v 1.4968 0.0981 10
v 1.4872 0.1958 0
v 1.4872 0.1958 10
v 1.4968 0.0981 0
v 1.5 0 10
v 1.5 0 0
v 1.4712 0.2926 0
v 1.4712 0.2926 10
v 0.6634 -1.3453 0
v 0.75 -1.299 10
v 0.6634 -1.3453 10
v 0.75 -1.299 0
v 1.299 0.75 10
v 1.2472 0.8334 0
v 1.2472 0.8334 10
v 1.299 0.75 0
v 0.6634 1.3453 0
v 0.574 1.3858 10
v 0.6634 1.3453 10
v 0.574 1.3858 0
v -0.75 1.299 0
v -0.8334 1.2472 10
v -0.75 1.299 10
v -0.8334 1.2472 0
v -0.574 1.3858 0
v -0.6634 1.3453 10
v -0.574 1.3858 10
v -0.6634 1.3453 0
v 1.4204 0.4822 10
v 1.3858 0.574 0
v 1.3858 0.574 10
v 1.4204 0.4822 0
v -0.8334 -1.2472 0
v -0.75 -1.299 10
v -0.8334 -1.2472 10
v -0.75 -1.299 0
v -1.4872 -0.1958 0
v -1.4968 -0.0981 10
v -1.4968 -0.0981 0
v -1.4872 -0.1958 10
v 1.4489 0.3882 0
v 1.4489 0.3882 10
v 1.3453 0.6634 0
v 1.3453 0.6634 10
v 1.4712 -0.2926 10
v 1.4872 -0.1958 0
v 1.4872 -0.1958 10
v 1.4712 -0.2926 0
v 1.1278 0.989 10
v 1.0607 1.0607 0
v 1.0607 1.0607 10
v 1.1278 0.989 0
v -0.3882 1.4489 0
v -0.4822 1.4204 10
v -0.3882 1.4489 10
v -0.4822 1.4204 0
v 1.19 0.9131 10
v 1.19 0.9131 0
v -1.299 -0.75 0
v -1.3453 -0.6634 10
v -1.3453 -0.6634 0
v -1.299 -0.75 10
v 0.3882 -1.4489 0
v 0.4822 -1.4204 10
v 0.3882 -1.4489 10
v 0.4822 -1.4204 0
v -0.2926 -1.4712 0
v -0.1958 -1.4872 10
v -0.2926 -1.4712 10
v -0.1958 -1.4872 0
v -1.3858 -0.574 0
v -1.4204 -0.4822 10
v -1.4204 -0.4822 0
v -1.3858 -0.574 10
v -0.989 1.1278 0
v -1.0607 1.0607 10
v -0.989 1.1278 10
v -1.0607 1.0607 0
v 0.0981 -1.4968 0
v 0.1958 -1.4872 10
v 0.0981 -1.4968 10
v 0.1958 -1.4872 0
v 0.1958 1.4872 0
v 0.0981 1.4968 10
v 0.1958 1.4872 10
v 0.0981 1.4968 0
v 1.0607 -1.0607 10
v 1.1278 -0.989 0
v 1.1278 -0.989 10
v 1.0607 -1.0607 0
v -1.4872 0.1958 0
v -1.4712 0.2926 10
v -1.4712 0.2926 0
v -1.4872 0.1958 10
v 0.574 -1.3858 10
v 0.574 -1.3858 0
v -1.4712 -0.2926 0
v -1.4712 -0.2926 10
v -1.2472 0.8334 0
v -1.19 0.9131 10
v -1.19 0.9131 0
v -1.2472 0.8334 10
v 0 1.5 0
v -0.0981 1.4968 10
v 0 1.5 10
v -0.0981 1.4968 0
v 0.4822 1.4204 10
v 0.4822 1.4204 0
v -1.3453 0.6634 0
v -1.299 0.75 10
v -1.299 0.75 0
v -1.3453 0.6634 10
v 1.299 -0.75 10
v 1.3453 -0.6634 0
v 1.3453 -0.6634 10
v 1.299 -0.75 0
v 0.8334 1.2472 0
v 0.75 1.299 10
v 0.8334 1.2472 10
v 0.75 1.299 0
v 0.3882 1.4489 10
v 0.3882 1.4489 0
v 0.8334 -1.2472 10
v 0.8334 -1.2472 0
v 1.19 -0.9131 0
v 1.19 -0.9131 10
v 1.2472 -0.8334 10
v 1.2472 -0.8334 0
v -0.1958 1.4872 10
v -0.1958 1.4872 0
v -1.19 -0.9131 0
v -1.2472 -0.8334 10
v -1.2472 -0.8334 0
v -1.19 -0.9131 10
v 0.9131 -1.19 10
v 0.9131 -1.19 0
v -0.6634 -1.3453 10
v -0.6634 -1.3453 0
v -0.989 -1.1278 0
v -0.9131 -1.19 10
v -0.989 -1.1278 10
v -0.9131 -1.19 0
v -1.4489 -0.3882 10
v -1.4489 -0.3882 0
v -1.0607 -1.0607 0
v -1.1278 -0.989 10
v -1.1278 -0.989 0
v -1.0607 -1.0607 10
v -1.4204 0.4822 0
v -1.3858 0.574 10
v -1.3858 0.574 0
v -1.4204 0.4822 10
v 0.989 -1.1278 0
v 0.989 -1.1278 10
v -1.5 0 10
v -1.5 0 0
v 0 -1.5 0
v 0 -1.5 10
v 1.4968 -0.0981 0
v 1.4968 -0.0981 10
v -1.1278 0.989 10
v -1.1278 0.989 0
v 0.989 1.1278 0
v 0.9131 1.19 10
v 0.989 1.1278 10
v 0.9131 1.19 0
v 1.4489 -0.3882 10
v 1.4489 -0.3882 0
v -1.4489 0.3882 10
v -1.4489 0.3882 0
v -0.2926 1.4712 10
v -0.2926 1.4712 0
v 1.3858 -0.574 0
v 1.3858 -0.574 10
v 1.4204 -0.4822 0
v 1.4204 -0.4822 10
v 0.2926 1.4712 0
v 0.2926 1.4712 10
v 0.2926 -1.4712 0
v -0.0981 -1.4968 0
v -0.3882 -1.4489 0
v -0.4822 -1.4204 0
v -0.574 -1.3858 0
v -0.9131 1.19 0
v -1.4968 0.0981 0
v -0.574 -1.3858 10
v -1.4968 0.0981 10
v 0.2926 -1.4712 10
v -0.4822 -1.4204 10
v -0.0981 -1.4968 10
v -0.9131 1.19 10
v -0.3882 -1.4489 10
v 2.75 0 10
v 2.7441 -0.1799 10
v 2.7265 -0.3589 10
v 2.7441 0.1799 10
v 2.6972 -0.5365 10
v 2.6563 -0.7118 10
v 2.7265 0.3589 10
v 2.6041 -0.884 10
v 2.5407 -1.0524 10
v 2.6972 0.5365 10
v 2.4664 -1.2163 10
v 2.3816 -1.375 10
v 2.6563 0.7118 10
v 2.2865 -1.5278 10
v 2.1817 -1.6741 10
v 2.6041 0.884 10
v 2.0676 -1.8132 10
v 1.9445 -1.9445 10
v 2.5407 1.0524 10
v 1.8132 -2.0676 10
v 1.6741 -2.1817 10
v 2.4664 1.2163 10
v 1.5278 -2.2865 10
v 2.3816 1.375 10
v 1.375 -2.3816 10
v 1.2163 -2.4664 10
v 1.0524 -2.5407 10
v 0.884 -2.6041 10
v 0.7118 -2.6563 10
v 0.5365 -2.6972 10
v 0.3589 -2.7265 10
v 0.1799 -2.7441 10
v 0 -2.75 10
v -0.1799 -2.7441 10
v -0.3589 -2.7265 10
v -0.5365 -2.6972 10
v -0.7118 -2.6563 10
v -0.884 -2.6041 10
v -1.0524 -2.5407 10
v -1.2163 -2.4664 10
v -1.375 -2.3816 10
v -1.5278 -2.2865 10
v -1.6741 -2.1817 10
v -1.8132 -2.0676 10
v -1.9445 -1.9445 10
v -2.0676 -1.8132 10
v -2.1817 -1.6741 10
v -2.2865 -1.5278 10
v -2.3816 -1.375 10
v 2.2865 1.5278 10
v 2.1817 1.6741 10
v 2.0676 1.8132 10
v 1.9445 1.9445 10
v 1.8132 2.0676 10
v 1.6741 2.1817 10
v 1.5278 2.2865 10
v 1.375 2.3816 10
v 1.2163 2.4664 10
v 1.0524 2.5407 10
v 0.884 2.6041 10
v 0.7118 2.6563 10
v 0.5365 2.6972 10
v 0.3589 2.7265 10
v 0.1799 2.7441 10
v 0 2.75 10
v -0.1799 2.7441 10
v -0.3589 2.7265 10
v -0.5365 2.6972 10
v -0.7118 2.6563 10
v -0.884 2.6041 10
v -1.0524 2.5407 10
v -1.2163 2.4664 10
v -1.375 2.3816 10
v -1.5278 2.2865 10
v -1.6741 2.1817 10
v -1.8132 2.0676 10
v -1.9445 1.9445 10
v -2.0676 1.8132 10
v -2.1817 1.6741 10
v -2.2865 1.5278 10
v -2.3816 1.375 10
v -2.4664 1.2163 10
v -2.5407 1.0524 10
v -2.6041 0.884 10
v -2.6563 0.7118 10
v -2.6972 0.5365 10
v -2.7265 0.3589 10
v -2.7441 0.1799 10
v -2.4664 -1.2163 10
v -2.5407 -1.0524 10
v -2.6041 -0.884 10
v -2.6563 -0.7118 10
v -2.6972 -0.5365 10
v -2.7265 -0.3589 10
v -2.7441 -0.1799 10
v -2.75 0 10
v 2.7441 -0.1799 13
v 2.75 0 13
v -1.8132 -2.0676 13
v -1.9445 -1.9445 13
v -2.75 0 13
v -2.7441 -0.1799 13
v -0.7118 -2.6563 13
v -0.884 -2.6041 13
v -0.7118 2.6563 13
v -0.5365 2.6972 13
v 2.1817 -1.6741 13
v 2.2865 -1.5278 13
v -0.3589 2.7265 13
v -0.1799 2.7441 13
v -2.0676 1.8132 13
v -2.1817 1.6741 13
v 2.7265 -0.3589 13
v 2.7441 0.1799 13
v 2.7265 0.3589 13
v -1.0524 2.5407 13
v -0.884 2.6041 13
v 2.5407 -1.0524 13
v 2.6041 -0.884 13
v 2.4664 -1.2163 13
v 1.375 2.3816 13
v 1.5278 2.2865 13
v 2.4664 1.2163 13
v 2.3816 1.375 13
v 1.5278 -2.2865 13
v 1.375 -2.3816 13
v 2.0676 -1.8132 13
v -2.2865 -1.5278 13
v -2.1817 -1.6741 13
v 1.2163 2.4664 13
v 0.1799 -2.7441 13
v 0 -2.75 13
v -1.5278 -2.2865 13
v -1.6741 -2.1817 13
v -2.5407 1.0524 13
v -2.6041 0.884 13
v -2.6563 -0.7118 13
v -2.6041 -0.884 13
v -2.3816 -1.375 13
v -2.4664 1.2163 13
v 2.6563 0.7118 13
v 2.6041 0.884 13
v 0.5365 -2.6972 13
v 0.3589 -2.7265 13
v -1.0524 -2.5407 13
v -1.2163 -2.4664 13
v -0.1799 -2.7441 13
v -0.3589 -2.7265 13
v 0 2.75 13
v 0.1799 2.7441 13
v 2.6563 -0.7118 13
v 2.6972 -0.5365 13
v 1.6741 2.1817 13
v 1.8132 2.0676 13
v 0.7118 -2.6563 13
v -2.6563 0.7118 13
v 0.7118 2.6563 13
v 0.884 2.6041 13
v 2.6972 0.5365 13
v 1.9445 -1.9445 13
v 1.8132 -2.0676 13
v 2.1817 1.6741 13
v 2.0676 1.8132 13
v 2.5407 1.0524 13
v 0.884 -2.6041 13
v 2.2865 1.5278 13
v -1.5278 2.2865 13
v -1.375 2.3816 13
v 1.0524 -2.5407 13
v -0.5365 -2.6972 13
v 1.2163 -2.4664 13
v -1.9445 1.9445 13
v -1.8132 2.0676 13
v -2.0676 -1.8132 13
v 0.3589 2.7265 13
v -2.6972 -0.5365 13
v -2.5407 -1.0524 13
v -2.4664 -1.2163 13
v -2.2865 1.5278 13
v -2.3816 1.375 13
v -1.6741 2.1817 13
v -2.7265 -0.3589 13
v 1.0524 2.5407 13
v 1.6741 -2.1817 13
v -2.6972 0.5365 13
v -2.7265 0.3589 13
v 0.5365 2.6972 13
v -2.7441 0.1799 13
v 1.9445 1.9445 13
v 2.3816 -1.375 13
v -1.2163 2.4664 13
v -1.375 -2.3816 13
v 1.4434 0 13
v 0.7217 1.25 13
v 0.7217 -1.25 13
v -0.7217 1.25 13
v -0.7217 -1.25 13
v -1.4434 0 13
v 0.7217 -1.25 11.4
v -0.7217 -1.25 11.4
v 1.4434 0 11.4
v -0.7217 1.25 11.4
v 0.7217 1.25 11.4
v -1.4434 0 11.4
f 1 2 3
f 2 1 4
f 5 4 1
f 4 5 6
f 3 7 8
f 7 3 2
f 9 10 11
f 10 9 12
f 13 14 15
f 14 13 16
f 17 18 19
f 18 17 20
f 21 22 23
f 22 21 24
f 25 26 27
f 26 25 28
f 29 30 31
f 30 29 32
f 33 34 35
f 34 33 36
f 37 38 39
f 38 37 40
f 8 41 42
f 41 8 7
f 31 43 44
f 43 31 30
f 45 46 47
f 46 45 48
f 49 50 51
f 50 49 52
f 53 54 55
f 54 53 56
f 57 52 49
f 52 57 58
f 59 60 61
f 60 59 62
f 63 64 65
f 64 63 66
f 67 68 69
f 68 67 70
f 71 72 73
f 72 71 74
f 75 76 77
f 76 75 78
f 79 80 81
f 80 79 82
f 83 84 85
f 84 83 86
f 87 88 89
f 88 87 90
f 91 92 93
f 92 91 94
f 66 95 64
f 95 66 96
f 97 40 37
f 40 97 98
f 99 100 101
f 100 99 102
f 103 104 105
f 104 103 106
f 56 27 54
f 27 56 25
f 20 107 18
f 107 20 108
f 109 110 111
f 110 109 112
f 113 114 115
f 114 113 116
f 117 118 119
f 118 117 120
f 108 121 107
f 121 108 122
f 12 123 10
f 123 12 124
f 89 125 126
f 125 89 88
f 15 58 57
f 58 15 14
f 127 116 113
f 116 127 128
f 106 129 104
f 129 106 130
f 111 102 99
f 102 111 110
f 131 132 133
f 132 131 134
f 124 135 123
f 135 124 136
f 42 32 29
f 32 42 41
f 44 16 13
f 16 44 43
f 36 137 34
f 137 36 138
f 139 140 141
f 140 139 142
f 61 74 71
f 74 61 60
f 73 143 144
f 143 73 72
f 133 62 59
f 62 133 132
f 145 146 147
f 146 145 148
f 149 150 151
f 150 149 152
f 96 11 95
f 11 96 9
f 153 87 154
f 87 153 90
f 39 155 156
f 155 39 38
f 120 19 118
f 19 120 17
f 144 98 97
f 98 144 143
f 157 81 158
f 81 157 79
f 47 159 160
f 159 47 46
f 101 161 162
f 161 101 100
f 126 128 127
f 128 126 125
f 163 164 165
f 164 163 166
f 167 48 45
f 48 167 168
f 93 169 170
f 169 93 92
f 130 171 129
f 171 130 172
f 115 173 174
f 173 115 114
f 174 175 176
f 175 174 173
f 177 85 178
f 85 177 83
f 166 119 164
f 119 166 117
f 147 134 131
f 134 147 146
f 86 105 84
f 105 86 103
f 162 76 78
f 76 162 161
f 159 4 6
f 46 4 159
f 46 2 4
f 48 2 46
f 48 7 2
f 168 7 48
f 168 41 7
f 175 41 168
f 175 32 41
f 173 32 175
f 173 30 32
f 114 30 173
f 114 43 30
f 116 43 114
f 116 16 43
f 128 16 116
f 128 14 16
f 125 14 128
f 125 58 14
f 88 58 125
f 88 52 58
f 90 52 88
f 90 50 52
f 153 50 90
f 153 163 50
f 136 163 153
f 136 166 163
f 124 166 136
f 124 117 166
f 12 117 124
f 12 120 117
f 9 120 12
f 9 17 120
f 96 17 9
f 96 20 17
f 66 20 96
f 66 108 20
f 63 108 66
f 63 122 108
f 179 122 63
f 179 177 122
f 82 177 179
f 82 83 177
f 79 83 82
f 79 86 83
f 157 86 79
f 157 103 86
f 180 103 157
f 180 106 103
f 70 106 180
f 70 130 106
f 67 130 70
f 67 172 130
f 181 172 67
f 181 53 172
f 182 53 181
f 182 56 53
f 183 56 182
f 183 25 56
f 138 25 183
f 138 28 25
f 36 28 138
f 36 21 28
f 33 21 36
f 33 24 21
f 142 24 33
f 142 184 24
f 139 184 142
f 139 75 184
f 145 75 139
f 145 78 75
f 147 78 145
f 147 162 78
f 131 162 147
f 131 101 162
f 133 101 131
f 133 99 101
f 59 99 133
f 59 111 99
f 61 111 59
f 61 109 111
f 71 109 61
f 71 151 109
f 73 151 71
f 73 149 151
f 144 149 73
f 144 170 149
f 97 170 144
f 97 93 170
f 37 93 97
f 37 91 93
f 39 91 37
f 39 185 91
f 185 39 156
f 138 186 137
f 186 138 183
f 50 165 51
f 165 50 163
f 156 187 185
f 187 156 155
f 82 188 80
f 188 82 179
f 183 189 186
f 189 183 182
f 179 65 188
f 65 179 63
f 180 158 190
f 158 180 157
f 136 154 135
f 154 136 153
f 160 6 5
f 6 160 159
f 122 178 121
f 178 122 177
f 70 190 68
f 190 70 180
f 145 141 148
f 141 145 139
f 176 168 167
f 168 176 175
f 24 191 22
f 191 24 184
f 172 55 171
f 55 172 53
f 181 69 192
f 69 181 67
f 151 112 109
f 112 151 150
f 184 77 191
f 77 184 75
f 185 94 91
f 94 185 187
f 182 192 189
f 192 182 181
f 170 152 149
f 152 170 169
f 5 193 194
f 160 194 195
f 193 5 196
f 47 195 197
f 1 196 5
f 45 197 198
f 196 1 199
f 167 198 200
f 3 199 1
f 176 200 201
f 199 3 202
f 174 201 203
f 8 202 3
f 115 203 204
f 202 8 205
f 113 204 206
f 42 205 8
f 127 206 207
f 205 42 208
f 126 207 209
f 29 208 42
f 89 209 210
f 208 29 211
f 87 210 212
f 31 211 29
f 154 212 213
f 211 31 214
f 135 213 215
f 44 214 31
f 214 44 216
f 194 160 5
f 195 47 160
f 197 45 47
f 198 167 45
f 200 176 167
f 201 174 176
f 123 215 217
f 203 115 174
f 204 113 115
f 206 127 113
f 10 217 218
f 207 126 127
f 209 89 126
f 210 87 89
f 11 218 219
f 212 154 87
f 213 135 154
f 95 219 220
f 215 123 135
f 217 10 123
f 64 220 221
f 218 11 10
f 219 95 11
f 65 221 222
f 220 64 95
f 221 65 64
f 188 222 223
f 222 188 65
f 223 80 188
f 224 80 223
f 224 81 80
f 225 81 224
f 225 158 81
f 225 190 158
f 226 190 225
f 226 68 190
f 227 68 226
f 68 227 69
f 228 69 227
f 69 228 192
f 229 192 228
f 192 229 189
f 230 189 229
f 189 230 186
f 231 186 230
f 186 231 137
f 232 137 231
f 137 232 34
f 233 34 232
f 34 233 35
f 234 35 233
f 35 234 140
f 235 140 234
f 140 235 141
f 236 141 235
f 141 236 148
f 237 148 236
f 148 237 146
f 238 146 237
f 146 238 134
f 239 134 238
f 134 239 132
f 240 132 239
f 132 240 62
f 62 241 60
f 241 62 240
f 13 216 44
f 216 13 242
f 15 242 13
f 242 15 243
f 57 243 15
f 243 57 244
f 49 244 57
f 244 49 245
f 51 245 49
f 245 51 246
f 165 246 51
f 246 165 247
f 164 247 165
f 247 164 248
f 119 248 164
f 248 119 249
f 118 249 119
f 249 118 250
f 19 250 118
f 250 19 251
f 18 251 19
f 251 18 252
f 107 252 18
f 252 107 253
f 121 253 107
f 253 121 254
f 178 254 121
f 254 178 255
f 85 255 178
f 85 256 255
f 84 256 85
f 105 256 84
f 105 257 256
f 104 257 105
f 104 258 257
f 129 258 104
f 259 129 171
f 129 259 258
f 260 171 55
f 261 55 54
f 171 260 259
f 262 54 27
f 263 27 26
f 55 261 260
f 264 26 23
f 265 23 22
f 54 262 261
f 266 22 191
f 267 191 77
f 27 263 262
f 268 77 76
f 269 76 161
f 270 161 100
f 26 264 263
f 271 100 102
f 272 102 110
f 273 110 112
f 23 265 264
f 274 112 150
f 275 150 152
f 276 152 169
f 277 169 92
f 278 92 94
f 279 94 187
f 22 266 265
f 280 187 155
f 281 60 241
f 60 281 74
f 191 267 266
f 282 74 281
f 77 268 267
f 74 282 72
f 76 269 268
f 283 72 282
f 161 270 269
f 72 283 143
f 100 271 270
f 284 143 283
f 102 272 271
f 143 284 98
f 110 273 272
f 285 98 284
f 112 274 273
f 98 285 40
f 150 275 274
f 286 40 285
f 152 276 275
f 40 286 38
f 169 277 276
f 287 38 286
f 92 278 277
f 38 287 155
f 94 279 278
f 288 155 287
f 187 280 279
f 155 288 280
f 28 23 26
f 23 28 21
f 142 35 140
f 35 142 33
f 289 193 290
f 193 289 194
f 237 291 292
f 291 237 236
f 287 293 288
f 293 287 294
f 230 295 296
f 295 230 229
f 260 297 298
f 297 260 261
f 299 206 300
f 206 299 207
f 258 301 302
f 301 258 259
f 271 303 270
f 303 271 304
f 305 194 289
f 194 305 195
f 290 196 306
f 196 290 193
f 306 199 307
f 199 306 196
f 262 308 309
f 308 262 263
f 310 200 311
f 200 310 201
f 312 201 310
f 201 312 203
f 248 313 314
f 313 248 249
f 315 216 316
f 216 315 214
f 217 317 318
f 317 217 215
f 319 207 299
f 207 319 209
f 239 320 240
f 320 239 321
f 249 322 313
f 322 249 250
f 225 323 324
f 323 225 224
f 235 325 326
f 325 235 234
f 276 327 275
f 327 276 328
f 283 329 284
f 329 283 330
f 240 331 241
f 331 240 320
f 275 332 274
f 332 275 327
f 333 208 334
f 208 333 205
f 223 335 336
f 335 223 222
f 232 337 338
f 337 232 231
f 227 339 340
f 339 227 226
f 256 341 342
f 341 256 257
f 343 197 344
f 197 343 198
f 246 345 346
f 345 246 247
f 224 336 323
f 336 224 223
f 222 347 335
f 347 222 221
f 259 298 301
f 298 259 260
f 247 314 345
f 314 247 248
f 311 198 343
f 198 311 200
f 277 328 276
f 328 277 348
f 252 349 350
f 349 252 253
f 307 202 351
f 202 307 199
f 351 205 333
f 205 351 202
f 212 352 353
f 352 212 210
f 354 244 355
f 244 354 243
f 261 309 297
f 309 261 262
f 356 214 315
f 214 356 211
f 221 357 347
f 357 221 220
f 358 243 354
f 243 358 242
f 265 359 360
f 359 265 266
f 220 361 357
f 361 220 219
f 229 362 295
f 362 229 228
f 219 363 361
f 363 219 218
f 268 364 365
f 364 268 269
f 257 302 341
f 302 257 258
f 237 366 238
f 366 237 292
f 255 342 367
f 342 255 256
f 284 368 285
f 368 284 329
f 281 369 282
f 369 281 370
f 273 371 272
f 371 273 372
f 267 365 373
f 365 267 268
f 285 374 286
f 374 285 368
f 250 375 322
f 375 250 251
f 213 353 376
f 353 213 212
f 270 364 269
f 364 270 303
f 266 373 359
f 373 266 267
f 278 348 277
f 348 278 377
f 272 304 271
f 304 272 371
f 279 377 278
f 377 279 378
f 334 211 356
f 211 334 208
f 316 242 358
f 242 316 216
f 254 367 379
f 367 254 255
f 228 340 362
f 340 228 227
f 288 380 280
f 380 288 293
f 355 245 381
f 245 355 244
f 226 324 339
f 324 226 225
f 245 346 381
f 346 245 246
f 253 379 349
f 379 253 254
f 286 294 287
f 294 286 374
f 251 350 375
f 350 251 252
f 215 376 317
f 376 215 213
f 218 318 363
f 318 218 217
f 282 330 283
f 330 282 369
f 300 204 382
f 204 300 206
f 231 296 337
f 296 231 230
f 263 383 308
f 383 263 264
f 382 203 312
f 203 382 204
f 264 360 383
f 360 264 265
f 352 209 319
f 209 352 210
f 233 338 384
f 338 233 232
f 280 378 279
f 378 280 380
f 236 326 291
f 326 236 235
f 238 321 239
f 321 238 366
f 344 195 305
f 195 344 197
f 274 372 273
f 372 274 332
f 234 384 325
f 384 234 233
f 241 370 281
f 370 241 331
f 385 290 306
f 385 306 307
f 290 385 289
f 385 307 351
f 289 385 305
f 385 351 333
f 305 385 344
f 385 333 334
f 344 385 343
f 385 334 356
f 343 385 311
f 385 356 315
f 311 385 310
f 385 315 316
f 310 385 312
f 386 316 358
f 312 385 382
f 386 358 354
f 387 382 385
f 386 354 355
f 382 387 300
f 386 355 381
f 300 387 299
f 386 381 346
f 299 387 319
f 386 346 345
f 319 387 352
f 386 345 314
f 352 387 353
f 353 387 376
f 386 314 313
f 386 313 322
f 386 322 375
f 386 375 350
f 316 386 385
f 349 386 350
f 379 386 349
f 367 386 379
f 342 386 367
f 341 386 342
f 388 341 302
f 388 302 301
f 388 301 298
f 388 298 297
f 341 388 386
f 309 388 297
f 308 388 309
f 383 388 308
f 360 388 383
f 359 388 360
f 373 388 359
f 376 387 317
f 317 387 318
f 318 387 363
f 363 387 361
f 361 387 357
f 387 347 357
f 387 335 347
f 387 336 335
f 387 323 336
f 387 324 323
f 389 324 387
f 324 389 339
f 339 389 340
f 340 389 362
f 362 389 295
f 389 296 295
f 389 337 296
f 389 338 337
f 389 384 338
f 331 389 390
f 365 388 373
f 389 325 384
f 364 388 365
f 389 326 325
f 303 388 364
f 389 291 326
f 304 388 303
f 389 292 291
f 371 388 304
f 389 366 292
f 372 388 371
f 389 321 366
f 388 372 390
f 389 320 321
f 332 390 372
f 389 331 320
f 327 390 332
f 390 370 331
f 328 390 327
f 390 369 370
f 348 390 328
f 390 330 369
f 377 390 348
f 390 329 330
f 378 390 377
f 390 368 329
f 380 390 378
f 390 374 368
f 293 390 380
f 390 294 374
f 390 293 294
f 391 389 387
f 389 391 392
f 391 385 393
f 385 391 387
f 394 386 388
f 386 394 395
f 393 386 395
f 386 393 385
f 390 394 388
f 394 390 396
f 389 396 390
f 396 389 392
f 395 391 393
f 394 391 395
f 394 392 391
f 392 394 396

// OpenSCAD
$fn = 96;

d_shaft = 3.0;
L = 10.0;

d_head = 5.5;
h_head = 3.0;

hex_af = 2.5;          // typical for M3 socket
hex_depth = 1.6;       // typical socket depth
hex_corner_d = hex_af / cos(30);  // across corners for regular hex

module socket_head_cap_screw() {
    difference() {
        union() {
            // Shaft
            cylinder(d = d_shaft, h = L);

            // Head
            translate([0,0,L])
                cylinder(d = d_head, h = h_head);
        }

        // Hex socket recess
        translate([0,0,L + h_head - hex_depth])
            cylinder(d = hex_corner_d, h = hex_depth + 0.02, $fn = 6);
    }
}

socket_head_cap_screw();
